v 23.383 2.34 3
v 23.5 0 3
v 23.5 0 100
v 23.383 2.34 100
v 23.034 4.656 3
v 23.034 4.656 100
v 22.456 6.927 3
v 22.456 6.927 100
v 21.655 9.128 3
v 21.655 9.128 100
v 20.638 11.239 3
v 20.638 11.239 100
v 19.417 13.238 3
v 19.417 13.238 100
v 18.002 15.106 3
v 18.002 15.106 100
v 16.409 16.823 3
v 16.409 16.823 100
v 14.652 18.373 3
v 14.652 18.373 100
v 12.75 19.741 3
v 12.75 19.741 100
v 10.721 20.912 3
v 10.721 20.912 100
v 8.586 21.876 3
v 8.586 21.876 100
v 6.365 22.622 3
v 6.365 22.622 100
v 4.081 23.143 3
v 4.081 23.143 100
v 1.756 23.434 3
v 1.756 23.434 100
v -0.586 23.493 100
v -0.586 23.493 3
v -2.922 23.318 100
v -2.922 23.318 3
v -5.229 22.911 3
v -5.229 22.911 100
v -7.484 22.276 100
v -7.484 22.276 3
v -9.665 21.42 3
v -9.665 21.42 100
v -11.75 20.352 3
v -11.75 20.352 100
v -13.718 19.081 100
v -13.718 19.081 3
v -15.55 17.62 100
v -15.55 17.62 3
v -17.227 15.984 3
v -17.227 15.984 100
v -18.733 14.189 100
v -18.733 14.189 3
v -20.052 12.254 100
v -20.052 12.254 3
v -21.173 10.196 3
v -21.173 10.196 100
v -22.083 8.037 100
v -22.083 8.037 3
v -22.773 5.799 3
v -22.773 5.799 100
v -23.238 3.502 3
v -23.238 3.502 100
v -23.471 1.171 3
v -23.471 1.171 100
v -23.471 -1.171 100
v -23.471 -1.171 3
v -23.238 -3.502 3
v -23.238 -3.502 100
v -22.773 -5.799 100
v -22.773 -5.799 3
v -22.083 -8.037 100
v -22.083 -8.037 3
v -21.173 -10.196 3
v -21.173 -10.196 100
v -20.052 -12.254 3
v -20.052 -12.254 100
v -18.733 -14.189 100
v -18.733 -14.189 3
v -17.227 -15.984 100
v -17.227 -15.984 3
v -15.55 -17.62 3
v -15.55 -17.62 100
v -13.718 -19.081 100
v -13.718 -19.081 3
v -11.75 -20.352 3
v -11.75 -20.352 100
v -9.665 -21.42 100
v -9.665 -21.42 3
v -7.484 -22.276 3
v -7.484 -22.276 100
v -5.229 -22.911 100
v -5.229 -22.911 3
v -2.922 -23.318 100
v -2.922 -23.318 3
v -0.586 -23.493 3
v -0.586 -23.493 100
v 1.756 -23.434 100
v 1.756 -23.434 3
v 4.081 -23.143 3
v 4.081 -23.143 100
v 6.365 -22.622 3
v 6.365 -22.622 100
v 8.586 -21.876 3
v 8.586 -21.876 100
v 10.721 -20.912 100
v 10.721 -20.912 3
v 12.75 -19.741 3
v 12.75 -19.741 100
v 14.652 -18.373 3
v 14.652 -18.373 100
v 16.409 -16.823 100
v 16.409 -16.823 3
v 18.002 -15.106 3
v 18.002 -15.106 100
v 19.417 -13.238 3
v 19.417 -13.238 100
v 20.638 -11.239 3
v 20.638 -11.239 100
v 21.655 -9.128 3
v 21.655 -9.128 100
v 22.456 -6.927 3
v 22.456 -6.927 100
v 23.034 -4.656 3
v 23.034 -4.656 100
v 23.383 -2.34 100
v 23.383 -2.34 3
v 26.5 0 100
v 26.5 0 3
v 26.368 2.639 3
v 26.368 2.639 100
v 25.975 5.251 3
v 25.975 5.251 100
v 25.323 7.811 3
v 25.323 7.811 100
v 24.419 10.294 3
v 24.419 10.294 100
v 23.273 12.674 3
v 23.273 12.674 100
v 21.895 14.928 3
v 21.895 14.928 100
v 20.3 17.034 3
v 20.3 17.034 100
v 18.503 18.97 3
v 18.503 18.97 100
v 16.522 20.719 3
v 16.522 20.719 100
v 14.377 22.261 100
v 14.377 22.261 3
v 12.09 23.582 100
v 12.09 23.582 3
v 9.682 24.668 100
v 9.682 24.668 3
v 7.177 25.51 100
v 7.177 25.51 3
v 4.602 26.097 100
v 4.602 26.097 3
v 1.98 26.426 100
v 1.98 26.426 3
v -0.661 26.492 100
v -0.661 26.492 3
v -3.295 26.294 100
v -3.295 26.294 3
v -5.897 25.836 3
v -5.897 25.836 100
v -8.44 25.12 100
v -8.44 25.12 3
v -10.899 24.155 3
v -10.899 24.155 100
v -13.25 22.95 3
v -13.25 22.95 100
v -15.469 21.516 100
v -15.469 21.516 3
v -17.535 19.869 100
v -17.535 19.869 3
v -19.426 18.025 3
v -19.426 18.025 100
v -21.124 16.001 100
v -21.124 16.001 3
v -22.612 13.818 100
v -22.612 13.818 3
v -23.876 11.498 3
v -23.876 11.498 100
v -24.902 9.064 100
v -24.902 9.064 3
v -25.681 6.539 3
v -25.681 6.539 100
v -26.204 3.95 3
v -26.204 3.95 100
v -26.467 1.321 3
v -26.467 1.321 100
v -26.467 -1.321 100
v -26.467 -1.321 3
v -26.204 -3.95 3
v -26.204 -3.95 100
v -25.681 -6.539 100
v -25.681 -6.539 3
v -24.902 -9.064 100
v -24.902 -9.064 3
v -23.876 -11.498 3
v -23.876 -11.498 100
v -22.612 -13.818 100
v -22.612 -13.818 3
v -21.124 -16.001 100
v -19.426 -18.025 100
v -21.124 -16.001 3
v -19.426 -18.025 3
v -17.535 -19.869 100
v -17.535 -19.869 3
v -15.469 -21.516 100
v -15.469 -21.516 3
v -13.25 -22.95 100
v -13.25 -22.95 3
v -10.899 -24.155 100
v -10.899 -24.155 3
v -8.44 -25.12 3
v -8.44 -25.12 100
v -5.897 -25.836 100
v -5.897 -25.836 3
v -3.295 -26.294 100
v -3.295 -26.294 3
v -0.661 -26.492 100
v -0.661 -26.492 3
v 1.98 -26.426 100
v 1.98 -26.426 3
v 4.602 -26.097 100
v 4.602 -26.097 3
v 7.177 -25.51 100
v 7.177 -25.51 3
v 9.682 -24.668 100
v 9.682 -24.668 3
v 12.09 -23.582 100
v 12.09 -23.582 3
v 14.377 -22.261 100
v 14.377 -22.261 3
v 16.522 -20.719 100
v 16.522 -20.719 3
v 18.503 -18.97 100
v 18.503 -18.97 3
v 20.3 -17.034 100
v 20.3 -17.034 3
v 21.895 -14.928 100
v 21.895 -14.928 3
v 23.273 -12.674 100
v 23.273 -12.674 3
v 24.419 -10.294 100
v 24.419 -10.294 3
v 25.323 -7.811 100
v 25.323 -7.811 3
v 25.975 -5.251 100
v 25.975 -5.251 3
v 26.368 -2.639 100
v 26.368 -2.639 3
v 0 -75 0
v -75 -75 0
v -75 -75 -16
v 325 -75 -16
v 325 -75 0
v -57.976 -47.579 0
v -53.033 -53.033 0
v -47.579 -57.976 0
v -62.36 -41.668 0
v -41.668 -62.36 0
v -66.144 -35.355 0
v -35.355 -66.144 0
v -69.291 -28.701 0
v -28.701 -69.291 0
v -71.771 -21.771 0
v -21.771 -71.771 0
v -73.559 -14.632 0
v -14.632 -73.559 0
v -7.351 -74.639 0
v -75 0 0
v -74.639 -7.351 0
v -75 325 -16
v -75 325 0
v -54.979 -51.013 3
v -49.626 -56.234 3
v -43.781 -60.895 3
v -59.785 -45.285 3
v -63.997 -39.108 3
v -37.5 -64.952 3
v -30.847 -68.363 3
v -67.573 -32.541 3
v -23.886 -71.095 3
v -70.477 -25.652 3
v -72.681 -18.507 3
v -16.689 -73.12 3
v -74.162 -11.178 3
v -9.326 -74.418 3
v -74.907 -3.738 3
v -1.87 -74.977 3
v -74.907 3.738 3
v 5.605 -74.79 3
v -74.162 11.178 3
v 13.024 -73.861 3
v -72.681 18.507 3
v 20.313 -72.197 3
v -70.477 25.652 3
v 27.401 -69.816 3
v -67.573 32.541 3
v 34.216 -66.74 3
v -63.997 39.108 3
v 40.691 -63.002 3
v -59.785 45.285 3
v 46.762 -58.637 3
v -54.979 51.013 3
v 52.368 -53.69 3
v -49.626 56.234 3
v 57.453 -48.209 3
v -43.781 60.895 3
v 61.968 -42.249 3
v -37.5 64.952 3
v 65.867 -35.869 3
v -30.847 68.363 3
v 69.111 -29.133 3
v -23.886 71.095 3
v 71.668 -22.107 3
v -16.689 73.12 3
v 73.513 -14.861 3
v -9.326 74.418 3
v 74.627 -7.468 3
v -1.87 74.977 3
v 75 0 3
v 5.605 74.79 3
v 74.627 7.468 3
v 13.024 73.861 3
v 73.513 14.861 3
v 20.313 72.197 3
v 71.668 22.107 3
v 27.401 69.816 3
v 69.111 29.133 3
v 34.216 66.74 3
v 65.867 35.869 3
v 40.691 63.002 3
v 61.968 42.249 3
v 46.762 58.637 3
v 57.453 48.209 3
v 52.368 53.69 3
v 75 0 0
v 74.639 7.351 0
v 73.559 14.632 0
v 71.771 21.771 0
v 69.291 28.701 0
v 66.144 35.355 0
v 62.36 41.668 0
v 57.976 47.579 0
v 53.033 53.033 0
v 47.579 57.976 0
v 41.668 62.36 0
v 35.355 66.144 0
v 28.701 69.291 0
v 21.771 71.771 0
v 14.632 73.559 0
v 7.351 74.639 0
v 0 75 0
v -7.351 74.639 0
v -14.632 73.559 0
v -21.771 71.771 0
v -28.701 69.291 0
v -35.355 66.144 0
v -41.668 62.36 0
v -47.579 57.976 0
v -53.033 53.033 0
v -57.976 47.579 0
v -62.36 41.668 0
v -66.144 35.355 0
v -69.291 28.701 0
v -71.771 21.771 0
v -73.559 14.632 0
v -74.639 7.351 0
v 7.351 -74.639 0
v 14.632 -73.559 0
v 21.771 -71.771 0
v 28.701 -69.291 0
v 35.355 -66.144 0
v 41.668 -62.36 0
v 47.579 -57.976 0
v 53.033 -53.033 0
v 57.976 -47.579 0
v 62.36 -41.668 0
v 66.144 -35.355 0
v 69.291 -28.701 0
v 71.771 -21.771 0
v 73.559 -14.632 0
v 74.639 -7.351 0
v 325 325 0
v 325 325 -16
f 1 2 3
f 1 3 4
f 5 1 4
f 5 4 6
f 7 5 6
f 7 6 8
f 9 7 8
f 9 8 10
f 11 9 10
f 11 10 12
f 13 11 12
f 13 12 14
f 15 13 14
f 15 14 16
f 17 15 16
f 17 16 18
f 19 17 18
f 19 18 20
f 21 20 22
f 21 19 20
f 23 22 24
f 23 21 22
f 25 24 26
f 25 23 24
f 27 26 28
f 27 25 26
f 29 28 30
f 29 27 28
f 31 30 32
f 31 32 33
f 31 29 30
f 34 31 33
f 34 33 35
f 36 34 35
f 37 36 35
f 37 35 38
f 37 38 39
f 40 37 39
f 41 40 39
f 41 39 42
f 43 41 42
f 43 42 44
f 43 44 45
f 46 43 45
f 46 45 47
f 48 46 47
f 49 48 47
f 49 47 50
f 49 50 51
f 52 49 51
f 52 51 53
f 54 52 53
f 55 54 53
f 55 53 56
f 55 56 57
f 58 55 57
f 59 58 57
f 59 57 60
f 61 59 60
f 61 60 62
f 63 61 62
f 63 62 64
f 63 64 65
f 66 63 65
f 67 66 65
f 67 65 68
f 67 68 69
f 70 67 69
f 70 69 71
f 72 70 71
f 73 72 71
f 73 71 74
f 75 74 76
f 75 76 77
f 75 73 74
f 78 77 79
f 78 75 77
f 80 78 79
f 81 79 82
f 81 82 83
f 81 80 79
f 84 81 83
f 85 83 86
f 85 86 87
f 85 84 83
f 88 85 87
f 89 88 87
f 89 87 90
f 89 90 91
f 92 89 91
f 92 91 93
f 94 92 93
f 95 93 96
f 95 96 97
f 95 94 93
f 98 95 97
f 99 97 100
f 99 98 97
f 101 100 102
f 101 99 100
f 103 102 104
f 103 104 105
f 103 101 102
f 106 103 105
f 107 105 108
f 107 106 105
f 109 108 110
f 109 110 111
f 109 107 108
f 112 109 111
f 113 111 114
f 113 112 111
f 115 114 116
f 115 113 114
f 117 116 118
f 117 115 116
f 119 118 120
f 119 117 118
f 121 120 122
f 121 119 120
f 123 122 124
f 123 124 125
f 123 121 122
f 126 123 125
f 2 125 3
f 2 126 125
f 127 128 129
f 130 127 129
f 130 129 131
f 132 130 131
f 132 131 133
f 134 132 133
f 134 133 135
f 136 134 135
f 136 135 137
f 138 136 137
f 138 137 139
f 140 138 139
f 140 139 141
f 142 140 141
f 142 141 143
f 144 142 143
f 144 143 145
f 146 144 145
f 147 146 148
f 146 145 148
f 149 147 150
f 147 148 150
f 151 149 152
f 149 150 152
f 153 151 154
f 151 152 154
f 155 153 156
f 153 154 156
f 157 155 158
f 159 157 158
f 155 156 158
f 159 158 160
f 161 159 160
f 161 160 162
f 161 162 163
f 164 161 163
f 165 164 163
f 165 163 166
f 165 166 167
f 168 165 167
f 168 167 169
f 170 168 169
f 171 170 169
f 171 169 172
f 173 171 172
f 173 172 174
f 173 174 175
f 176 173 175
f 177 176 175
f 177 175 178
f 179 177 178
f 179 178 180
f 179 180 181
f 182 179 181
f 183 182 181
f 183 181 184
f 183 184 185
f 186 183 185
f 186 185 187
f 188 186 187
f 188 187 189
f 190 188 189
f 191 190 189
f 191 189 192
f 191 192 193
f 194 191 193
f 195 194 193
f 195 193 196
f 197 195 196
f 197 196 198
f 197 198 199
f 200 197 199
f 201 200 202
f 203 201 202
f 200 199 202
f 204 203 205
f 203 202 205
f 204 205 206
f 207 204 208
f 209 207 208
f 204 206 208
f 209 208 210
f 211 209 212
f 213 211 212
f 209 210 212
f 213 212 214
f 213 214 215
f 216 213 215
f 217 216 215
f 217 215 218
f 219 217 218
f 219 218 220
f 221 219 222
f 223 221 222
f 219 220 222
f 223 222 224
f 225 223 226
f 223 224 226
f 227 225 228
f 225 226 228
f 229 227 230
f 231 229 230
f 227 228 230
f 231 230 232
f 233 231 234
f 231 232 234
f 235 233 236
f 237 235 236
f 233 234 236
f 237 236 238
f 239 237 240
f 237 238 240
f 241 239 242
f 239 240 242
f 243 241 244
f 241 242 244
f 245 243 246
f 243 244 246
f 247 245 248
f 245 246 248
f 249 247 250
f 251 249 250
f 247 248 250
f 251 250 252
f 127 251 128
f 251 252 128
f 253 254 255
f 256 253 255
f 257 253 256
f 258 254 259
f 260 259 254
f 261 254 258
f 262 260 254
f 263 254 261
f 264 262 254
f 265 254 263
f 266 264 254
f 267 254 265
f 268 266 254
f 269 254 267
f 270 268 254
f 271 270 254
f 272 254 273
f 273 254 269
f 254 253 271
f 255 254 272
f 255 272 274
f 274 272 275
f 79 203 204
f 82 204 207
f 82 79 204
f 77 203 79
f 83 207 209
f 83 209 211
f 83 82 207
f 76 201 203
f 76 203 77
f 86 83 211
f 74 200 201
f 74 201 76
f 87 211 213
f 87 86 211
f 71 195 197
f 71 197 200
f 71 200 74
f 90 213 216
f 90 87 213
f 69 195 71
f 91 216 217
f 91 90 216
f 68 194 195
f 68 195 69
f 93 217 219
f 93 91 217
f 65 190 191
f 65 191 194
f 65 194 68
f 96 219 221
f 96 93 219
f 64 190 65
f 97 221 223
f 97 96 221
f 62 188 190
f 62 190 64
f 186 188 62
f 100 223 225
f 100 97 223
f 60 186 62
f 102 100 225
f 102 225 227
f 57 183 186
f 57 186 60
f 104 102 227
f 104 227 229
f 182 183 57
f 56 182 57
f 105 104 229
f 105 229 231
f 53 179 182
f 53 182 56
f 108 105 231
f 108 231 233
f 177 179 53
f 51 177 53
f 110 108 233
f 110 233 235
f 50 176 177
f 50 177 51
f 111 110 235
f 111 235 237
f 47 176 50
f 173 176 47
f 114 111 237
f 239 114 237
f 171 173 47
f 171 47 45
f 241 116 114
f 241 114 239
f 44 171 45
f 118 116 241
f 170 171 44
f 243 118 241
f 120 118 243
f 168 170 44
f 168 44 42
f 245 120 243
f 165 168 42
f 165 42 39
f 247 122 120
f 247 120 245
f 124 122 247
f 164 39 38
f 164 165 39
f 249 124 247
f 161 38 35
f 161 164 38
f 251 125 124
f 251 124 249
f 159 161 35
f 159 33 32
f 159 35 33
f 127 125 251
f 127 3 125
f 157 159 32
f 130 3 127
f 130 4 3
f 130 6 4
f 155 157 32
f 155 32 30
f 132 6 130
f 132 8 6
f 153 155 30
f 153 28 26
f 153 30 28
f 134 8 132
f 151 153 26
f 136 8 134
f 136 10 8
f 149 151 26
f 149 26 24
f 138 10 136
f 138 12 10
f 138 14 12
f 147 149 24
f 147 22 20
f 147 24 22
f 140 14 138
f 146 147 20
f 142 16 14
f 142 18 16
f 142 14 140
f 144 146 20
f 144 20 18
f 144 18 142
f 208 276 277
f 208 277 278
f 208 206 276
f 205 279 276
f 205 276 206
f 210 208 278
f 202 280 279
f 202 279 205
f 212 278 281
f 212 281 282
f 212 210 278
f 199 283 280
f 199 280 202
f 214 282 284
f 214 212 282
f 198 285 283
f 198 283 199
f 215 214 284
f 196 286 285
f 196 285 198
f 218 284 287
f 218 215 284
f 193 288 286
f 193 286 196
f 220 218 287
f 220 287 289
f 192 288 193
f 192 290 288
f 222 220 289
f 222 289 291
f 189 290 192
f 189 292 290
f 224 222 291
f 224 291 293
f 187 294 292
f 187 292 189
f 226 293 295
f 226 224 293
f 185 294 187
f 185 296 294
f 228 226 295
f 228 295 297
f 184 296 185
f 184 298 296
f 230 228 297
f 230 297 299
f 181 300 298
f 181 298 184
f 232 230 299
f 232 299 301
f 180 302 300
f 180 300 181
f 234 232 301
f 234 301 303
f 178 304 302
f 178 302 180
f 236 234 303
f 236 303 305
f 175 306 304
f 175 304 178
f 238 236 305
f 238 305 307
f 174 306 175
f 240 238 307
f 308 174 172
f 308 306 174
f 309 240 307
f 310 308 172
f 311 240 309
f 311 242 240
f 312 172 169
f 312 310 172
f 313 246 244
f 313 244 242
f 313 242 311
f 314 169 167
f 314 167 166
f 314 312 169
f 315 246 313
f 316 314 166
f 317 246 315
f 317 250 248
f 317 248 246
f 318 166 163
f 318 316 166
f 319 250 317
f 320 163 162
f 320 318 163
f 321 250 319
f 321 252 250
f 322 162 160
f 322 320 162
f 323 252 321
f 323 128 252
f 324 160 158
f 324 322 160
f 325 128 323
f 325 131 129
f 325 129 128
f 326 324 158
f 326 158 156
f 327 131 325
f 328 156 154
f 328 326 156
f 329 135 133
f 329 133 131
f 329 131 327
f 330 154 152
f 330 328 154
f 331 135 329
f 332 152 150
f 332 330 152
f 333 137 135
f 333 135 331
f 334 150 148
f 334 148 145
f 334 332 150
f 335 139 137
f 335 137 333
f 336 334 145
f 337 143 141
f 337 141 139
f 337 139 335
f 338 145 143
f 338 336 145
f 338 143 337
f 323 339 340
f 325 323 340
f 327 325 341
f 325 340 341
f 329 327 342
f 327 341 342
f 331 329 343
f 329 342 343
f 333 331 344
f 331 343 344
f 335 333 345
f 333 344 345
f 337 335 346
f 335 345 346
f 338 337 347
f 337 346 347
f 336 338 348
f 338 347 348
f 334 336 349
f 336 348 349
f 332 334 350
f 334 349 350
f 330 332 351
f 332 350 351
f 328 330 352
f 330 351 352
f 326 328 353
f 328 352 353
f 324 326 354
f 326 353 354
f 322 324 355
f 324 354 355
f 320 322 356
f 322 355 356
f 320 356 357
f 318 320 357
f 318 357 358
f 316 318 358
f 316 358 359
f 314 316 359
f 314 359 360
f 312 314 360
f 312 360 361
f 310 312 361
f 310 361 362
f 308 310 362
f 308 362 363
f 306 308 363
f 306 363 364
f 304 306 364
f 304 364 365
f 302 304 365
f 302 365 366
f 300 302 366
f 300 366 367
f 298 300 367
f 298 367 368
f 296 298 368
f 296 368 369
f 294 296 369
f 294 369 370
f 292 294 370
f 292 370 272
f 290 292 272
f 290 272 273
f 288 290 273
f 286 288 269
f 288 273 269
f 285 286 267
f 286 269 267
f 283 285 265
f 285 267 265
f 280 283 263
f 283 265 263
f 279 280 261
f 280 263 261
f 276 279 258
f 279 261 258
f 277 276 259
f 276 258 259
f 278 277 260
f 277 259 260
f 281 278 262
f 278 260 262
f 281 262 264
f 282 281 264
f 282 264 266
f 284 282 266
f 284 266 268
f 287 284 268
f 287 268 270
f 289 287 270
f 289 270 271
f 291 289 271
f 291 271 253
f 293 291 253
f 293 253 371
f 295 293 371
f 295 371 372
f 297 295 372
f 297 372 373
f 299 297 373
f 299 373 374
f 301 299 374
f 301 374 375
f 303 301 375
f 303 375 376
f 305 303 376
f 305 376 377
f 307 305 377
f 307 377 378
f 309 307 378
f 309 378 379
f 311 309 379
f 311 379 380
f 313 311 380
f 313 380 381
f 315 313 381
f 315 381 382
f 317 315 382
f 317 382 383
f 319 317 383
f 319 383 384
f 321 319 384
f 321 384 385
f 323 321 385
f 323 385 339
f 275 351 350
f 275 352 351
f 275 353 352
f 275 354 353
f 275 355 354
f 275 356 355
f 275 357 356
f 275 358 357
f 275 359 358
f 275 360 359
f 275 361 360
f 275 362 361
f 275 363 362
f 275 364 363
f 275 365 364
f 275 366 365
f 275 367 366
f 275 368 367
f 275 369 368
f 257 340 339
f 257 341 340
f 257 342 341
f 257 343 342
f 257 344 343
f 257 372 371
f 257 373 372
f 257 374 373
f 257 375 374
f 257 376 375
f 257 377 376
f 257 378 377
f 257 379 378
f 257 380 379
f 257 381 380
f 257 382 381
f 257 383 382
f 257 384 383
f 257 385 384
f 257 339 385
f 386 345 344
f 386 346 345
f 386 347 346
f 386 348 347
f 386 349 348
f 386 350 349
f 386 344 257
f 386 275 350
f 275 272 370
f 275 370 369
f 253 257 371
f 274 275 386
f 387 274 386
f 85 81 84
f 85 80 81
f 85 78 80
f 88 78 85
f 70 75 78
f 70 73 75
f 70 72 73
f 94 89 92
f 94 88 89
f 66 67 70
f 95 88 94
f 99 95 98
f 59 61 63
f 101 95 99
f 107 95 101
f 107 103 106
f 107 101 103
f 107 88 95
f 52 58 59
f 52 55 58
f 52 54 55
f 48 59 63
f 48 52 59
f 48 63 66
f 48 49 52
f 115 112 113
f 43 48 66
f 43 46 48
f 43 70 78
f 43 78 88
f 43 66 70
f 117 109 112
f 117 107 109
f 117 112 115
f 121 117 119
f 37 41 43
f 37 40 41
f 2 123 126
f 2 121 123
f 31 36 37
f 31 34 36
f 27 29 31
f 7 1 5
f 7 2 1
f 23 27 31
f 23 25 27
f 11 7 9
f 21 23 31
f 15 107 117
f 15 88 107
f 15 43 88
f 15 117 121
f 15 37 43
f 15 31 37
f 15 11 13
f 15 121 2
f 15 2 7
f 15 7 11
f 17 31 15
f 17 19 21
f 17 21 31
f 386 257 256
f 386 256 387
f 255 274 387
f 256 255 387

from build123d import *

# Parameters (mm, degrees)
F0_R     = 26.5
F1_DEPTH = 100
F2_T     = -3
F3_R     = 75
F4_DEPTH = 3
F5_W     = 400
F5_H     = 400
F6_DEPTH = 16


# Not quite as in the source:
# - a feature names something its author has since deleted; it is built from what else it names


with BuildPart() as f1:
    # F0 (on Top) → F1 (new body)
    with BuildSketch(Plane.XY):
        Circle(F0_R)
    extrude(amount=F1_DEPTH)

    # F2
    f2_openings = [f1.faces().sort_by_distance(p)[0] for p in [
        (0, 0, 100),
        (0, 0, 0),
    ]]
    offset(amount=F2_T, openings=f2_openings)

    # F3 (on Top) → F4 (join)
    with BuildSketch(Plane.XY):
        Circle(F3_R)
    extrude(amount=F4_DEPTH)

    # F5 (on Top) → F6 (join)
    with BuildSketch(Plane.XY):
        with Locations((125, 125)):
            Rectangle(F5_W, F5_H)
    extrude(amount=-F6_DEPTH)


solid = f1.part
